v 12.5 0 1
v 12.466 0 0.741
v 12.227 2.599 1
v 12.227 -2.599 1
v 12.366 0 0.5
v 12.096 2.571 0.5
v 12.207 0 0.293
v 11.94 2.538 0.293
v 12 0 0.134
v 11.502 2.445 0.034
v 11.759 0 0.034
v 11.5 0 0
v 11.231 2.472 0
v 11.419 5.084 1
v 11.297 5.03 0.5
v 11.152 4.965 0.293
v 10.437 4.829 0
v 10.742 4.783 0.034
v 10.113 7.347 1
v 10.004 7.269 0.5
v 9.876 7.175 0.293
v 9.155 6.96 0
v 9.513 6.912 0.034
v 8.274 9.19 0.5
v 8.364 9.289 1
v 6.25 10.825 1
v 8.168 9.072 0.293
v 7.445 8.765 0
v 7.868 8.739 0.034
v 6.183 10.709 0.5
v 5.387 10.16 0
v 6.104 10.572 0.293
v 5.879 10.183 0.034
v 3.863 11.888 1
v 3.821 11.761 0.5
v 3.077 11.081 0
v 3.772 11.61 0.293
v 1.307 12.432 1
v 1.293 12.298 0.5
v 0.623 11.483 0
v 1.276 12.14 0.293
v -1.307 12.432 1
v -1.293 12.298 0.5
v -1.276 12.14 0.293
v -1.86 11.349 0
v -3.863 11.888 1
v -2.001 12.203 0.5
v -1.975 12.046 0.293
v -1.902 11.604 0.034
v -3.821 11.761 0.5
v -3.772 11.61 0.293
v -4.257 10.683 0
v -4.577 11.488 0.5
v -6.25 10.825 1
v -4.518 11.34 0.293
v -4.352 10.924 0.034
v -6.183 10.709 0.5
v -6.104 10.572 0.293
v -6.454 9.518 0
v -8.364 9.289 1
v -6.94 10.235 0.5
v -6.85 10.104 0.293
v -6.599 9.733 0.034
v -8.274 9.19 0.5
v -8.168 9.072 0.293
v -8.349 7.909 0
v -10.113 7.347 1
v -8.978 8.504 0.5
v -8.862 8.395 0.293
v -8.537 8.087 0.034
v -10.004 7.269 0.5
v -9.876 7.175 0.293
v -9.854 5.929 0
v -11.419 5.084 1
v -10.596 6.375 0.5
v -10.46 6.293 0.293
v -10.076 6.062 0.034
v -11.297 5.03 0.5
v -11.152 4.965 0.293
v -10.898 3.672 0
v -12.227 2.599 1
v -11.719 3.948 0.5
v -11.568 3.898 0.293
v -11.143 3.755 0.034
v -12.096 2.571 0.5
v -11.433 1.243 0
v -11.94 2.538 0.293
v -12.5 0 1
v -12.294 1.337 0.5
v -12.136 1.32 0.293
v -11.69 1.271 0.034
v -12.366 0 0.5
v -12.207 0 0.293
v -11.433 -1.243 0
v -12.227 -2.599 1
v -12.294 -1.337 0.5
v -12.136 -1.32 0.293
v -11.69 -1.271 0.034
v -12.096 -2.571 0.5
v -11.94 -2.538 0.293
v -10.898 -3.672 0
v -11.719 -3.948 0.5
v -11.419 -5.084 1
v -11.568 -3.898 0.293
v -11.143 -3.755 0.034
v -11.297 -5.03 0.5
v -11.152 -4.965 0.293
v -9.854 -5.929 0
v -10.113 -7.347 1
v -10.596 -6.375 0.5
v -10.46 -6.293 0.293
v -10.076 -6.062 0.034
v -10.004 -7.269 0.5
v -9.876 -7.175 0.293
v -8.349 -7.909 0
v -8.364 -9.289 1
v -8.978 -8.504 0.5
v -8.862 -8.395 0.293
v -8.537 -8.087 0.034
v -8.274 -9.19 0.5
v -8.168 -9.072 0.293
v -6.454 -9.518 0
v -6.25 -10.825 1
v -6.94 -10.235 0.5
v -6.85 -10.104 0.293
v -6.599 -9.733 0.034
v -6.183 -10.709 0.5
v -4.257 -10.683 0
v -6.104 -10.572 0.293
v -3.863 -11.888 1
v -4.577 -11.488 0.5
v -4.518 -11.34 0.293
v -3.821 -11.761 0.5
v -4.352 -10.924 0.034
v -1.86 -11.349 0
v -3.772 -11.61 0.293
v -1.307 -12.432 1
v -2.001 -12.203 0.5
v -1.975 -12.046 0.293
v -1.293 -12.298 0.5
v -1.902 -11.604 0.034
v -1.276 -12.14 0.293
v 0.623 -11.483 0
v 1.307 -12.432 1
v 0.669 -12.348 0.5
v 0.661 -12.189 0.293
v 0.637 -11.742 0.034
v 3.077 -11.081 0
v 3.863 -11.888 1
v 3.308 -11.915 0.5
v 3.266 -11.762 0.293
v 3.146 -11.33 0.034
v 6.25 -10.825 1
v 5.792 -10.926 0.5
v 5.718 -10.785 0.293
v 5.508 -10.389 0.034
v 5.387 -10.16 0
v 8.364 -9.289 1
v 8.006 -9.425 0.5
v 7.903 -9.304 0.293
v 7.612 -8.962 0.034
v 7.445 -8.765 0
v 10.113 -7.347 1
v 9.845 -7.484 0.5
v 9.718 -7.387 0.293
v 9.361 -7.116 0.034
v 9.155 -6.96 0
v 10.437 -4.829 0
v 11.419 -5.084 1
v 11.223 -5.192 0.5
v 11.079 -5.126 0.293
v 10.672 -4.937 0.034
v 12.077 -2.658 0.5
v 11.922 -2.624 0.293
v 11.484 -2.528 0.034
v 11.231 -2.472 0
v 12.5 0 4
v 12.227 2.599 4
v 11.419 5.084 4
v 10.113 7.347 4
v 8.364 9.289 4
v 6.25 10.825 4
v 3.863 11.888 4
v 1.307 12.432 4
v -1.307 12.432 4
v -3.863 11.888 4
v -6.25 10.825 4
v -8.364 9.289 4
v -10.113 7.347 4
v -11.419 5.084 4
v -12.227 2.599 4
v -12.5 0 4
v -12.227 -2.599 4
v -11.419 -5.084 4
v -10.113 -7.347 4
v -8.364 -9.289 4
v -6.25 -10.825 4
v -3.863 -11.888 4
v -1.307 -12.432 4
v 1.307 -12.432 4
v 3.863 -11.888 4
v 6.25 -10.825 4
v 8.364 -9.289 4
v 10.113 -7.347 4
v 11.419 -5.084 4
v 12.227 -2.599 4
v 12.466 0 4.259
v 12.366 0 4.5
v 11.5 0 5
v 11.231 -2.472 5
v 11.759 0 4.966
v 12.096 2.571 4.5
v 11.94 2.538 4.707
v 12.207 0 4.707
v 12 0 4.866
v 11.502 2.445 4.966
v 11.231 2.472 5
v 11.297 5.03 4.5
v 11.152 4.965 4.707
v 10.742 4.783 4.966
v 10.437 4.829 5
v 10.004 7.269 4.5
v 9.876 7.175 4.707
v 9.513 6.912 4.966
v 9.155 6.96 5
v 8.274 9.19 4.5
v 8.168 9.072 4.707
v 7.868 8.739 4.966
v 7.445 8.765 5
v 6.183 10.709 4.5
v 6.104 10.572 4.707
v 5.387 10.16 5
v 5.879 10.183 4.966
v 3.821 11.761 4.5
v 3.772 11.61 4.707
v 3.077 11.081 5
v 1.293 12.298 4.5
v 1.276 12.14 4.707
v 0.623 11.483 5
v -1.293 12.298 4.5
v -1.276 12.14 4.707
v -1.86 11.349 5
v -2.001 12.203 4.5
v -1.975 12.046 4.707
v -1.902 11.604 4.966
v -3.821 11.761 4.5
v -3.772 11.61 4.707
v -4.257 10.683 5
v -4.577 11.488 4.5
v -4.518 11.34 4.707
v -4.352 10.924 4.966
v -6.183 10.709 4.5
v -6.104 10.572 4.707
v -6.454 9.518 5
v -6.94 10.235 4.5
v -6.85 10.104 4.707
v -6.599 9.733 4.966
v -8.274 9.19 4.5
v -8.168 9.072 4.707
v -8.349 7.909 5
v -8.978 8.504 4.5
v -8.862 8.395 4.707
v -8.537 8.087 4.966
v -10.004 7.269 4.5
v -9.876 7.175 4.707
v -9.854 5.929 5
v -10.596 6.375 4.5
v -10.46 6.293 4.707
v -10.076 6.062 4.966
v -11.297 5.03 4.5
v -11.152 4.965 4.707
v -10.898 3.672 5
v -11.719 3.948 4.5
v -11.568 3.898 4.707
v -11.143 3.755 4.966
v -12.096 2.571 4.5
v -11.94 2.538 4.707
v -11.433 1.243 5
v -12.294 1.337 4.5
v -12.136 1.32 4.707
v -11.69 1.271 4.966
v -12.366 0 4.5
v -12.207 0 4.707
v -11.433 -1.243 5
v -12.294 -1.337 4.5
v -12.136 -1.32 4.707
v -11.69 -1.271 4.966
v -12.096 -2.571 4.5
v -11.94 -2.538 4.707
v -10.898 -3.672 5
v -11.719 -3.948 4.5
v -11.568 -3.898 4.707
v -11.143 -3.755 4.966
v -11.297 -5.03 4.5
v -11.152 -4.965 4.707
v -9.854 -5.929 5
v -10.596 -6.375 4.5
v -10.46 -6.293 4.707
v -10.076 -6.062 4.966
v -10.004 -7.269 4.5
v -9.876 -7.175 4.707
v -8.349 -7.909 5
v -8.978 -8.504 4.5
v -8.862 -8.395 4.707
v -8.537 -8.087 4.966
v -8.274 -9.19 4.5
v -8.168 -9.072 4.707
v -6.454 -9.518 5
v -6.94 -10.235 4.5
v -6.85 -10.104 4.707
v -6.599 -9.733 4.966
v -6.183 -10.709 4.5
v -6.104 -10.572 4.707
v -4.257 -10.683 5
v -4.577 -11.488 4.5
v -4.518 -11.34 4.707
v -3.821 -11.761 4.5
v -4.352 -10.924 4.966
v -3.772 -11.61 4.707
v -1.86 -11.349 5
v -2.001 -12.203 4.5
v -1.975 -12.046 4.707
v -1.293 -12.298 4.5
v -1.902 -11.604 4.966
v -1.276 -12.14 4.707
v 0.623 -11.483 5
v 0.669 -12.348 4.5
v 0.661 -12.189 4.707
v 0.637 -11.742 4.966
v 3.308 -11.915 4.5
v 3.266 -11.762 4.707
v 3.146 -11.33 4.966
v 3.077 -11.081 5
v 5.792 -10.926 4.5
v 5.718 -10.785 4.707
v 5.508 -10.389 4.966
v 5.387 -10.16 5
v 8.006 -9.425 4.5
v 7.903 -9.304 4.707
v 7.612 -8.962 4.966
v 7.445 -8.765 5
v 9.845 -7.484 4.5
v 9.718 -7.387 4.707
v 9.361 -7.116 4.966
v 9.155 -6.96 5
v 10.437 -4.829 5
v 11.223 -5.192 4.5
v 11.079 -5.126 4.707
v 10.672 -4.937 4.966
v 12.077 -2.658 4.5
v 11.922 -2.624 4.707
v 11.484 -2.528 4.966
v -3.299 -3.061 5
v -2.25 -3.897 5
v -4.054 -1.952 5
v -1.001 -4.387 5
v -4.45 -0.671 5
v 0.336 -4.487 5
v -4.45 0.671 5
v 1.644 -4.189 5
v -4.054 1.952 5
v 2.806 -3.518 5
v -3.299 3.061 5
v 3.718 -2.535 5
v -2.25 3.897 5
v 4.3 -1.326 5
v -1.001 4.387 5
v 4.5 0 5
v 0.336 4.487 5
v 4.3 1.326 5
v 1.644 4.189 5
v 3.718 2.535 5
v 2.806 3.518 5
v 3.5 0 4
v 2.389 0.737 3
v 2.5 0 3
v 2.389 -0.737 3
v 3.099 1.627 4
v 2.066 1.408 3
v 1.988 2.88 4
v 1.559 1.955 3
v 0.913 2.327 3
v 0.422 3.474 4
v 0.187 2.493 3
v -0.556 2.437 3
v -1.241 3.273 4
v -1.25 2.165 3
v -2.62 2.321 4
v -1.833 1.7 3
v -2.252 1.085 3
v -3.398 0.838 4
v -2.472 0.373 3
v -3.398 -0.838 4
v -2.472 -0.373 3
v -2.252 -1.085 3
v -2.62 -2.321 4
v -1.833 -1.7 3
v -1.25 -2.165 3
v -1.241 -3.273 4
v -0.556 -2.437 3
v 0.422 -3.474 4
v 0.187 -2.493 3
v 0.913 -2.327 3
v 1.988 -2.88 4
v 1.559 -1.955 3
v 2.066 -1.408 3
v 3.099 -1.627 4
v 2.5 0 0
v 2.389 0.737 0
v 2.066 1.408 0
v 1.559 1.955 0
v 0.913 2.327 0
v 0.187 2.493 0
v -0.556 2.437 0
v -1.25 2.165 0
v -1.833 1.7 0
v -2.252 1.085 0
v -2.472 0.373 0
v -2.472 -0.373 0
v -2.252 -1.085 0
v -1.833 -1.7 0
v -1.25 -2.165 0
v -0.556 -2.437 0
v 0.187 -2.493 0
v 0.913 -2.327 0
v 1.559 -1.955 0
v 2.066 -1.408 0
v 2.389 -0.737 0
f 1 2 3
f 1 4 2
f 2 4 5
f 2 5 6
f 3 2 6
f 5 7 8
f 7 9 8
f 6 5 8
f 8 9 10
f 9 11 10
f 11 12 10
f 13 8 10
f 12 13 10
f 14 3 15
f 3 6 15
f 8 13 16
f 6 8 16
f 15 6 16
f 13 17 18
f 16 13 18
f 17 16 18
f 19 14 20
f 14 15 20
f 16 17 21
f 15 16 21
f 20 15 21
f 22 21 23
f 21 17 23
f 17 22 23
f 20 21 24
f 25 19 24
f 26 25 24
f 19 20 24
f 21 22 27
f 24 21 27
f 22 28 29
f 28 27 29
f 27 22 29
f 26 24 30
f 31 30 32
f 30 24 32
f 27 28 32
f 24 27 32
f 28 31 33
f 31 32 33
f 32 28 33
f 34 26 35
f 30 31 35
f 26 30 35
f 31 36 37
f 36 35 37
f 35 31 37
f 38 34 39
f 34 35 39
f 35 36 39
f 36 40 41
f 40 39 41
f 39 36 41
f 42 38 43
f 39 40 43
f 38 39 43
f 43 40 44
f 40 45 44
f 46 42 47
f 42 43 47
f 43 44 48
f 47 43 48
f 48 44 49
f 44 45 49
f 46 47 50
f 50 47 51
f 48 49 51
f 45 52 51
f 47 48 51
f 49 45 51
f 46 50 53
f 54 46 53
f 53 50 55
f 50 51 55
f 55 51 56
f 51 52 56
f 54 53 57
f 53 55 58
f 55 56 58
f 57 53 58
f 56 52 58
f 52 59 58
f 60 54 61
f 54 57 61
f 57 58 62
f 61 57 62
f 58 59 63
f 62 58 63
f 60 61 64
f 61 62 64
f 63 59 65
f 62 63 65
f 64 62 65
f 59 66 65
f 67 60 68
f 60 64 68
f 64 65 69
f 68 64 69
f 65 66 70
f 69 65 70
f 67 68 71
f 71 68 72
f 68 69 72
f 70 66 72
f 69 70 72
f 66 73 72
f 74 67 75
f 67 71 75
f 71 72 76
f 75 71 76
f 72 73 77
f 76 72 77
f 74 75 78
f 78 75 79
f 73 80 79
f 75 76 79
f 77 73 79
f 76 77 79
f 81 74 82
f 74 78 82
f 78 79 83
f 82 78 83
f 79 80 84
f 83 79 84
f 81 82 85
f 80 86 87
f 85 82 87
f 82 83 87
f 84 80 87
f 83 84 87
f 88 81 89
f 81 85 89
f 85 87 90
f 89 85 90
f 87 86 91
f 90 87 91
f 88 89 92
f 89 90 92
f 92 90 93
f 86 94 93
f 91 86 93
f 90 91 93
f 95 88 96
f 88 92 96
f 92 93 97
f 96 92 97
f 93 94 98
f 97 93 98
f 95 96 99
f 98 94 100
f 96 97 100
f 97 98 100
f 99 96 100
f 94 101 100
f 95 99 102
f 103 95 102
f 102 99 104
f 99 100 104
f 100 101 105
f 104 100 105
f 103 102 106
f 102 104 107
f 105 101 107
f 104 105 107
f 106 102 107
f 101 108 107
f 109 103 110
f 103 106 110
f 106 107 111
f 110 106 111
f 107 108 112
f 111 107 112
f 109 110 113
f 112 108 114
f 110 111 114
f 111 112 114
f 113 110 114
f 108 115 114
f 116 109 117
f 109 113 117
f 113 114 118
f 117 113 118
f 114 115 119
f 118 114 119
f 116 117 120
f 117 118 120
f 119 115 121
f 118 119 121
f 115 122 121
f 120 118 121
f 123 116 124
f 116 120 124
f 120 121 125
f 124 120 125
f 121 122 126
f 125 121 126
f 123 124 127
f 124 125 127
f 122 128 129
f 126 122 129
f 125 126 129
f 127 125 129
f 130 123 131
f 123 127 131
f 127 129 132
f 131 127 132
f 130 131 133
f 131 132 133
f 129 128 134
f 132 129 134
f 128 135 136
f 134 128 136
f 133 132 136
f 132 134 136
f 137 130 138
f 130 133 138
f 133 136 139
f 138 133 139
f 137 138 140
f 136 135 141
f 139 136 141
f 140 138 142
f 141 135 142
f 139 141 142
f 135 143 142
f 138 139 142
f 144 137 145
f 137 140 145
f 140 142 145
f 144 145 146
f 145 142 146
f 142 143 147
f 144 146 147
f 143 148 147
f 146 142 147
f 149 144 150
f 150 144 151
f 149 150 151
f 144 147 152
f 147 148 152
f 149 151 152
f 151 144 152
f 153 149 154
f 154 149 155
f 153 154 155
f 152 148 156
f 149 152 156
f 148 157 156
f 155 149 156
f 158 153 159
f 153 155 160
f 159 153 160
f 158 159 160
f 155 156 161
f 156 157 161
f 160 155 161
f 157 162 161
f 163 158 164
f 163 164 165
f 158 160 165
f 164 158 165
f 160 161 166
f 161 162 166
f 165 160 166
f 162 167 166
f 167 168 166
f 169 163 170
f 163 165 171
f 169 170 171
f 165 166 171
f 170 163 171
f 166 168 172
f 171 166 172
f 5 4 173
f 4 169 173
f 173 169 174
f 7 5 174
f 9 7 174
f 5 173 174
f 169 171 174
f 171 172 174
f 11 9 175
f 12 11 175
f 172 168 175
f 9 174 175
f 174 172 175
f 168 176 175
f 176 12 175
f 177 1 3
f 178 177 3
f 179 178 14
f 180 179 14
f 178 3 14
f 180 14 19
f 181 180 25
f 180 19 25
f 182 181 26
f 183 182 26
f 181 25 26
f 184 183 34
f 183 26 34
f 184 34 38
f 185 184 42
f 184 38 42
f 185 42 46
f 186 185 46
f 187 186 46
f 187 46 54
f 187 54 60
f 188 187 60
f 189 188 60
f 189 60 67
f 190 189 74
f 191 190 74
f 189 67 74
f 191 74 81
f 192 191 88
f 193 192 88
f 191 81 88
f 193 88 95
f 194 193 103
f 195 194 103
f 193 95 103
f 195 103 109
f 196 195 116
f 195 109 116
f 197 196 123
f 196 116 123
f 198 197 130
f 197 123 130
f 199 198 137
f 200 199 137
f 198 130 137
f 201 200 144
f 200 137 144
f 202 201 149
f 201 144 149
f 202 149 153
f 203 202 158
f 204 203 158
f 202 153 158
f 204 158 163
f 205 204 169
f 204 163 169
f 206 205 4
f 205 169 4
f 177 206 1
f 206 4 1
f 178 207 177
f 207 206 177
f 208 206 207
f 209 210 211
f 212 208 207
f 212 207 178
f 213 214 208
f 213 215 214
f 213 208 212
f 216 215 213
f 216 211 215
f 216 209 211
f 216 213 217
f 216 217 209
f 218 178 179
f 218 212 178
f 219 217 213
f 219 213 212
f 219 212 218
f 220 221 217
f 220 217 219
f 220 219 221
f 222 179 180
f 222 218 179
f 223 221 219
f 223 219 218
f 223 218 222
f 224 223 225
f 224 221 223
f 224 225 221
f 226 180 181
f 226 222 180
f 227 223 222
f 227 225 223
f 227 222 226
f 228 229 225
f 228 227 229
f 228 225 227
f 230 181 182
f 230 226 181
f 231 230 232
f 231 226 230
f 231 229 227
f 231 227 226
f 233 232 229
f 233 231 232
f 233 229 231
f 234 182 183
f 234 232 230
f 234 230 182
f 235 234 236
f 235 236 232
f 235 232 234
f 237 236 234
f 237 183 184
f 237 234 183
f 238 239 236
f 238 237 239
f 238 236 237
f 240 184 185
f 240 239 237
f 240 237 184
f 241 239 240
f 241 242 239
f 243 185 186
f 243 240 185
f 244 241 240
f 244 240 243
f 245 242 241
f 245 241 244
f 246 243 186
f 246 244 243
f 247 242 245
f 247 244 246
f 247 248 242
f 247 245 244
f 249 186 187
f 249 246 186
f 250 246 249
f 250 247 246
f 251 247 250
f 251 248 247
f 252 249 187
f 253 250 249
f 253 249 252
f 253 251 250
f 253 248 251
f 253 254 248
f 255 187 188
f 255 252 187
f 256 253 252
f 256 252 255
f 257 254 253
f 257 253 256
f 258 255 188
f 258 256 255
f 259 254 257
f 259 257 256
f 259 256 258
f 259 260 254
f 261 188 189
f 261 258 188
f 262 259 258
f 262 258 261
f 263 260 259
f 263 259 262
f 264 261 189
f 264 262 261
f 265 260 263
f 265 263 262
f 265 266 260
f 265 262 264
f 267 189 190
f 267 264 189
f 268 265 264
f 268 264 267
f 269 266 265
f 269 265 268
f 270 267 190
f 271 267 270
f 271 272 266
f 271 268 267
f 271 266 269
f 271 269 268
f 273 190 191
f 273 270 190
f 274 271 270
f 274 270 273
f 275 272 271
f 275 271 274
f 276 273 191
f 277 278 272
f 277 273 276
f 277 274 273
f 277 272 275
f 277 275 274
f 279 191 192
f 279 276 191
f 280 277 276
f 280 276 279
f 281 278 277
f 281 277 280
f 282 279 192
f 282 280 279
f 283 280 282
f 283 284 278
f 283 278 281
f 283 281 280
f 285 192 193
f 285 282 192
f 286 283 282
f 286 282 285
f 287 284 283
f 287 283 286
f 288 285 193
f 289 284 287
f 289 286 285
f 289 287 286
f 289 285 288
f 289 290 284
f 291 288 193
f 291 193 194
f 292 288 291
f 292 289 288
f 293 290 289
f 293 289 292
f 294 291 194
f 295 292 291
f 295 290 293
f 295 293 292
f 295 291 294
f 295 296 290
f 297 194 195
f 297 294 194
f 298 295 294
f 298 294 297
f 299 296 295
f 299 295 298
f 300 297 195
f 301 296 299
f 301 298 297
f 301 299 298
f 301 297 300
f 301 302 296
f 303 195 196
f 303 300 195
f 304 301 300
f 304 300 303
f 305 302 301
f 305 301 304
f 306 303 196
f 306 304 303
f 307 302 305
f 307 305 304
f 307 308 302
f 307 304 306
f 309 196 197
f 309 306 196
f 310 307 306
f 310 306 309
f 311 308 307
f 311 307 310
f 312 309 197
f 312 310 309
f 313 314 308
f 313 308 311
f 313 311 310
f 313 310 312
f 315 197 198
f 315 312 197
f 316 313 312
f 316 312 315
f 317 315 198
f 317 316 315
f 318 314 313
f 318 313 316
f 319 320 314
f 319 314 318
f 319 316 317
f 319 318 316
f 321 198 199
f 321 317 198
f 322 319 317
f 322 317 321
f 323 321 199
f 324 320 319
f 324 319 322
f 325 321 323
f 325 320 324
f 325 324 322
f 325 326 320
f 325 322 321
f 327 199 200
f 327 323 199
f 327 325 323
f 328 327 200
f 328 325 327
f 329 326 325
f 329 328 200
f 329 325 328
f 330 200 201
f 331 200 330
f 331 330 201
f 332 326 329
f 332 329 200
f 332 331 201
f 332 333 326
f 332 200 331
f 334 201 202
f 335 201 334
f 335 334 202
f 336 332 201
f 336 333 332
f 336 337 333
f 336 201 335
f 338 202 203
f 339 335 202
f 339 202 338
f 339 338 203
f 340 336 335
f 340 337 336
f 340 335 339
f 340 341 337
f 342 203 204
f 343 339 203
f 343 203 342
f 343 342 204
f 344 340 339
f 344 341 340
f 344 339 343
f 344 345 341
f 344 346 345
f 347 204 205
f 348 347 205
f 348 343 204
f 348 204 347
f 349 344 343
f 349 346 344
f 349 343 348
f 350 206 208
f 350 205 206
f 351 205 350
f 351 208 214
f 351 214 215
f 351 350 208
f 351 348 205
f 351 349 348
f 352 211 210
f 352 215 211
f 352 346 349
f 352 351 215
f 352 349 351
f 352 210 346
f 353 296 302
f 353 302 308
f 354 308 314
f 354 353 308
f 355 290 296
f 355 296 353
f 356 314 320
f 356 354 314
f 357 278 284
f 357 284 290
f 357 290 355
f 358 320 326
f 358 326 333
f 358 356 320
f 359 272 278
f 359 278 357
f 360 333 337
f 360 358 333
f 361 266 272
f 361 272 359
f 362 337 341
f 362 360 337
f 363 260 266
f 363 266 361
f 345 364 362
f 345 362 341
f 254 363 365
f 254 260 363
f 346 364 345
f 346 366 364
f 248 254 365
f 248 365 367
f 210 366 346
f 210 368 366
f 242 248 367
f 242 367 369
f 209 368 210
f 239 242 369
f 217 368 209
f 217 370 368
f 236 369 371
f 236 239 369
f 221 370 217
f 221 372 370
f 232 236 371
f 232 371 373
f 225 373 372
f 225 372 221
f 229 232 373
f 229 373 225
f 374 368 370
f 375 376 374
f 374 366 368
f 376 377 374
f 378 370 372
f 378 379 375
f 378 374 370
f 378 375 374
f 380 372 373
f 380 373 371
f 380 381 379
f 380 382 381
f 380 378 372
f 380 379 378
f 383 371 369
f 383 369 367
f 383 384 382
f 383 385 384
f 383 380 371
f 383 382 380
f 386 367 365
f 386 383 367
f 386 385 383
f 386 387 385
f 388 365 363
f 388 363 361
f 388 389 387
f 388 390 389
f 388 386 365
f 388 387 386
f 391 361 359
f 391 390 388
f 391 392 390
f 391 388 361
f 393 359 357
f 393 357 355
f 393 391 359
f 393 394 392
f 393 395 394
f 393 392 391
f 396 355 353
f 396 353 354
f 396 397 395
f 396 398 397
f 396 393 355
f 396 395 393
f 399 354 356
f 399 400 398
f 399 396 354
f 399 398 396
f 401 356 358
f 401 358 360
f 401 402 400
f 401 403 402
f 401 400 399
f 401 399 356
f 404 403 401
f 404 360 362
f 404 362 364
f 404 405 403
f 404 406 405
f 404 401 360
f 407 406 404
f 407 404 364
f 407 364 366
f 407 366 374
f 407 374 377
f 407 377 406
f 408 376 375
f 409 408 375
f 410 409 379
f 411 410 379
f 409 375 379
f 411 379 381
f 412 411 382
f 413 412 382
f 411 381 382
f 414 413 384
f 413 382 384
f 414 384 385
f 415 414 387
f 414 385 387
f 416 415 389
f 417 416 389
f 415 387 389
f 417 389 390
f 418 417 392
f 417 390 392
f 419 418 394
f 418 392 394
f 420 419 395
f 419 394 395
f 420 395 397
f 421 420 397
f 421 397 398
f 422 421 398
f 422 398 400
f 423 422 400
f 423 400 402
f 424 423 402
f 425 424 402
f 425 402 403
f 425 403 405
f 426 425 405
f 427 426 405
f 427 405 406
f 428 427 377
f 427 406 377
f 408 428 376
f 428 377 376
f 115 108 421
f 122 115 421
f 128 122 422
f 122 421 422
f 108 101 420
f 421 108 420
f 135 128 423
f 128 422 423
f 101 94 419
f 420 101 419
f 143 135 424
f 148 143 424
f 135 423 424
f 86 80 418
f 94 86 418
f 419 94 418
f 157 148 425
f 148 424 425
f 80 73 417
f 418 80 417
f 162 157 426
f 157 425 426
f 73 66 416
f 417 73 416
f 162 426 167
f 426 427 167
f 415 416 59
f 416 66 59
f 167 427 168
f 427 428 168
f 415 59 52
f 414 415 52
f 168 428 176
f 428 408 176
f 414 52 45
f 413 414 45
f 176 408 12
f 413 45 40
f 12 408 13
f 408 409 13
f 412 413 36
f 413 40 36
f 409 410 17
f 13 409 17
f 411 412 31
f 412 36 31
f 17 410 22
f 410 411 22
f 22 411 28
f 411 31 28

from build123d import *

# Parameters (mm, degrees)
SKETCH_R     = 12.5
PAD_DEPTH    = 5
FILLET_R     = 1
SKETCH001_R  = 2.5
POCKET_DEPTH = 5
CHAMFER_SIZE = 2


with BuildPart() as part:
    # Sketch (on XY_Plane of Origin) → Pad (new body)
    with BuildSketch(Plane.XY):
        Circle(SKETCH_R)
    extrude(amount=PAD_DEPTH)

    # Fillet
    fillet_edges = [part.edges().sort_by_distance(p)[0] for p in [
        (-12.5, 0, 5),
        (-12.5, 0, 0),
    ]]
    fillet(fillet_edges, radius=FILLET_R)

    # Sketch001 (on Face5 of Fillet) → Pocket (cut)
    with BuildSketch(Plane.XY.offset(5)):
        Circle(SKETCH001_R)
    extrude(amount=-POCKET_DEPTH, mode=Mode.SUBTRACT)

    # Chamfer
    chamfer_edges = [part.edges().sort_by_distance(p)[0] for p in [
        (-2.5, 0, 5),
    ]]
    chamfer(chamfer_edges, length=CHAMFER_SIZE)


solid = part.part
